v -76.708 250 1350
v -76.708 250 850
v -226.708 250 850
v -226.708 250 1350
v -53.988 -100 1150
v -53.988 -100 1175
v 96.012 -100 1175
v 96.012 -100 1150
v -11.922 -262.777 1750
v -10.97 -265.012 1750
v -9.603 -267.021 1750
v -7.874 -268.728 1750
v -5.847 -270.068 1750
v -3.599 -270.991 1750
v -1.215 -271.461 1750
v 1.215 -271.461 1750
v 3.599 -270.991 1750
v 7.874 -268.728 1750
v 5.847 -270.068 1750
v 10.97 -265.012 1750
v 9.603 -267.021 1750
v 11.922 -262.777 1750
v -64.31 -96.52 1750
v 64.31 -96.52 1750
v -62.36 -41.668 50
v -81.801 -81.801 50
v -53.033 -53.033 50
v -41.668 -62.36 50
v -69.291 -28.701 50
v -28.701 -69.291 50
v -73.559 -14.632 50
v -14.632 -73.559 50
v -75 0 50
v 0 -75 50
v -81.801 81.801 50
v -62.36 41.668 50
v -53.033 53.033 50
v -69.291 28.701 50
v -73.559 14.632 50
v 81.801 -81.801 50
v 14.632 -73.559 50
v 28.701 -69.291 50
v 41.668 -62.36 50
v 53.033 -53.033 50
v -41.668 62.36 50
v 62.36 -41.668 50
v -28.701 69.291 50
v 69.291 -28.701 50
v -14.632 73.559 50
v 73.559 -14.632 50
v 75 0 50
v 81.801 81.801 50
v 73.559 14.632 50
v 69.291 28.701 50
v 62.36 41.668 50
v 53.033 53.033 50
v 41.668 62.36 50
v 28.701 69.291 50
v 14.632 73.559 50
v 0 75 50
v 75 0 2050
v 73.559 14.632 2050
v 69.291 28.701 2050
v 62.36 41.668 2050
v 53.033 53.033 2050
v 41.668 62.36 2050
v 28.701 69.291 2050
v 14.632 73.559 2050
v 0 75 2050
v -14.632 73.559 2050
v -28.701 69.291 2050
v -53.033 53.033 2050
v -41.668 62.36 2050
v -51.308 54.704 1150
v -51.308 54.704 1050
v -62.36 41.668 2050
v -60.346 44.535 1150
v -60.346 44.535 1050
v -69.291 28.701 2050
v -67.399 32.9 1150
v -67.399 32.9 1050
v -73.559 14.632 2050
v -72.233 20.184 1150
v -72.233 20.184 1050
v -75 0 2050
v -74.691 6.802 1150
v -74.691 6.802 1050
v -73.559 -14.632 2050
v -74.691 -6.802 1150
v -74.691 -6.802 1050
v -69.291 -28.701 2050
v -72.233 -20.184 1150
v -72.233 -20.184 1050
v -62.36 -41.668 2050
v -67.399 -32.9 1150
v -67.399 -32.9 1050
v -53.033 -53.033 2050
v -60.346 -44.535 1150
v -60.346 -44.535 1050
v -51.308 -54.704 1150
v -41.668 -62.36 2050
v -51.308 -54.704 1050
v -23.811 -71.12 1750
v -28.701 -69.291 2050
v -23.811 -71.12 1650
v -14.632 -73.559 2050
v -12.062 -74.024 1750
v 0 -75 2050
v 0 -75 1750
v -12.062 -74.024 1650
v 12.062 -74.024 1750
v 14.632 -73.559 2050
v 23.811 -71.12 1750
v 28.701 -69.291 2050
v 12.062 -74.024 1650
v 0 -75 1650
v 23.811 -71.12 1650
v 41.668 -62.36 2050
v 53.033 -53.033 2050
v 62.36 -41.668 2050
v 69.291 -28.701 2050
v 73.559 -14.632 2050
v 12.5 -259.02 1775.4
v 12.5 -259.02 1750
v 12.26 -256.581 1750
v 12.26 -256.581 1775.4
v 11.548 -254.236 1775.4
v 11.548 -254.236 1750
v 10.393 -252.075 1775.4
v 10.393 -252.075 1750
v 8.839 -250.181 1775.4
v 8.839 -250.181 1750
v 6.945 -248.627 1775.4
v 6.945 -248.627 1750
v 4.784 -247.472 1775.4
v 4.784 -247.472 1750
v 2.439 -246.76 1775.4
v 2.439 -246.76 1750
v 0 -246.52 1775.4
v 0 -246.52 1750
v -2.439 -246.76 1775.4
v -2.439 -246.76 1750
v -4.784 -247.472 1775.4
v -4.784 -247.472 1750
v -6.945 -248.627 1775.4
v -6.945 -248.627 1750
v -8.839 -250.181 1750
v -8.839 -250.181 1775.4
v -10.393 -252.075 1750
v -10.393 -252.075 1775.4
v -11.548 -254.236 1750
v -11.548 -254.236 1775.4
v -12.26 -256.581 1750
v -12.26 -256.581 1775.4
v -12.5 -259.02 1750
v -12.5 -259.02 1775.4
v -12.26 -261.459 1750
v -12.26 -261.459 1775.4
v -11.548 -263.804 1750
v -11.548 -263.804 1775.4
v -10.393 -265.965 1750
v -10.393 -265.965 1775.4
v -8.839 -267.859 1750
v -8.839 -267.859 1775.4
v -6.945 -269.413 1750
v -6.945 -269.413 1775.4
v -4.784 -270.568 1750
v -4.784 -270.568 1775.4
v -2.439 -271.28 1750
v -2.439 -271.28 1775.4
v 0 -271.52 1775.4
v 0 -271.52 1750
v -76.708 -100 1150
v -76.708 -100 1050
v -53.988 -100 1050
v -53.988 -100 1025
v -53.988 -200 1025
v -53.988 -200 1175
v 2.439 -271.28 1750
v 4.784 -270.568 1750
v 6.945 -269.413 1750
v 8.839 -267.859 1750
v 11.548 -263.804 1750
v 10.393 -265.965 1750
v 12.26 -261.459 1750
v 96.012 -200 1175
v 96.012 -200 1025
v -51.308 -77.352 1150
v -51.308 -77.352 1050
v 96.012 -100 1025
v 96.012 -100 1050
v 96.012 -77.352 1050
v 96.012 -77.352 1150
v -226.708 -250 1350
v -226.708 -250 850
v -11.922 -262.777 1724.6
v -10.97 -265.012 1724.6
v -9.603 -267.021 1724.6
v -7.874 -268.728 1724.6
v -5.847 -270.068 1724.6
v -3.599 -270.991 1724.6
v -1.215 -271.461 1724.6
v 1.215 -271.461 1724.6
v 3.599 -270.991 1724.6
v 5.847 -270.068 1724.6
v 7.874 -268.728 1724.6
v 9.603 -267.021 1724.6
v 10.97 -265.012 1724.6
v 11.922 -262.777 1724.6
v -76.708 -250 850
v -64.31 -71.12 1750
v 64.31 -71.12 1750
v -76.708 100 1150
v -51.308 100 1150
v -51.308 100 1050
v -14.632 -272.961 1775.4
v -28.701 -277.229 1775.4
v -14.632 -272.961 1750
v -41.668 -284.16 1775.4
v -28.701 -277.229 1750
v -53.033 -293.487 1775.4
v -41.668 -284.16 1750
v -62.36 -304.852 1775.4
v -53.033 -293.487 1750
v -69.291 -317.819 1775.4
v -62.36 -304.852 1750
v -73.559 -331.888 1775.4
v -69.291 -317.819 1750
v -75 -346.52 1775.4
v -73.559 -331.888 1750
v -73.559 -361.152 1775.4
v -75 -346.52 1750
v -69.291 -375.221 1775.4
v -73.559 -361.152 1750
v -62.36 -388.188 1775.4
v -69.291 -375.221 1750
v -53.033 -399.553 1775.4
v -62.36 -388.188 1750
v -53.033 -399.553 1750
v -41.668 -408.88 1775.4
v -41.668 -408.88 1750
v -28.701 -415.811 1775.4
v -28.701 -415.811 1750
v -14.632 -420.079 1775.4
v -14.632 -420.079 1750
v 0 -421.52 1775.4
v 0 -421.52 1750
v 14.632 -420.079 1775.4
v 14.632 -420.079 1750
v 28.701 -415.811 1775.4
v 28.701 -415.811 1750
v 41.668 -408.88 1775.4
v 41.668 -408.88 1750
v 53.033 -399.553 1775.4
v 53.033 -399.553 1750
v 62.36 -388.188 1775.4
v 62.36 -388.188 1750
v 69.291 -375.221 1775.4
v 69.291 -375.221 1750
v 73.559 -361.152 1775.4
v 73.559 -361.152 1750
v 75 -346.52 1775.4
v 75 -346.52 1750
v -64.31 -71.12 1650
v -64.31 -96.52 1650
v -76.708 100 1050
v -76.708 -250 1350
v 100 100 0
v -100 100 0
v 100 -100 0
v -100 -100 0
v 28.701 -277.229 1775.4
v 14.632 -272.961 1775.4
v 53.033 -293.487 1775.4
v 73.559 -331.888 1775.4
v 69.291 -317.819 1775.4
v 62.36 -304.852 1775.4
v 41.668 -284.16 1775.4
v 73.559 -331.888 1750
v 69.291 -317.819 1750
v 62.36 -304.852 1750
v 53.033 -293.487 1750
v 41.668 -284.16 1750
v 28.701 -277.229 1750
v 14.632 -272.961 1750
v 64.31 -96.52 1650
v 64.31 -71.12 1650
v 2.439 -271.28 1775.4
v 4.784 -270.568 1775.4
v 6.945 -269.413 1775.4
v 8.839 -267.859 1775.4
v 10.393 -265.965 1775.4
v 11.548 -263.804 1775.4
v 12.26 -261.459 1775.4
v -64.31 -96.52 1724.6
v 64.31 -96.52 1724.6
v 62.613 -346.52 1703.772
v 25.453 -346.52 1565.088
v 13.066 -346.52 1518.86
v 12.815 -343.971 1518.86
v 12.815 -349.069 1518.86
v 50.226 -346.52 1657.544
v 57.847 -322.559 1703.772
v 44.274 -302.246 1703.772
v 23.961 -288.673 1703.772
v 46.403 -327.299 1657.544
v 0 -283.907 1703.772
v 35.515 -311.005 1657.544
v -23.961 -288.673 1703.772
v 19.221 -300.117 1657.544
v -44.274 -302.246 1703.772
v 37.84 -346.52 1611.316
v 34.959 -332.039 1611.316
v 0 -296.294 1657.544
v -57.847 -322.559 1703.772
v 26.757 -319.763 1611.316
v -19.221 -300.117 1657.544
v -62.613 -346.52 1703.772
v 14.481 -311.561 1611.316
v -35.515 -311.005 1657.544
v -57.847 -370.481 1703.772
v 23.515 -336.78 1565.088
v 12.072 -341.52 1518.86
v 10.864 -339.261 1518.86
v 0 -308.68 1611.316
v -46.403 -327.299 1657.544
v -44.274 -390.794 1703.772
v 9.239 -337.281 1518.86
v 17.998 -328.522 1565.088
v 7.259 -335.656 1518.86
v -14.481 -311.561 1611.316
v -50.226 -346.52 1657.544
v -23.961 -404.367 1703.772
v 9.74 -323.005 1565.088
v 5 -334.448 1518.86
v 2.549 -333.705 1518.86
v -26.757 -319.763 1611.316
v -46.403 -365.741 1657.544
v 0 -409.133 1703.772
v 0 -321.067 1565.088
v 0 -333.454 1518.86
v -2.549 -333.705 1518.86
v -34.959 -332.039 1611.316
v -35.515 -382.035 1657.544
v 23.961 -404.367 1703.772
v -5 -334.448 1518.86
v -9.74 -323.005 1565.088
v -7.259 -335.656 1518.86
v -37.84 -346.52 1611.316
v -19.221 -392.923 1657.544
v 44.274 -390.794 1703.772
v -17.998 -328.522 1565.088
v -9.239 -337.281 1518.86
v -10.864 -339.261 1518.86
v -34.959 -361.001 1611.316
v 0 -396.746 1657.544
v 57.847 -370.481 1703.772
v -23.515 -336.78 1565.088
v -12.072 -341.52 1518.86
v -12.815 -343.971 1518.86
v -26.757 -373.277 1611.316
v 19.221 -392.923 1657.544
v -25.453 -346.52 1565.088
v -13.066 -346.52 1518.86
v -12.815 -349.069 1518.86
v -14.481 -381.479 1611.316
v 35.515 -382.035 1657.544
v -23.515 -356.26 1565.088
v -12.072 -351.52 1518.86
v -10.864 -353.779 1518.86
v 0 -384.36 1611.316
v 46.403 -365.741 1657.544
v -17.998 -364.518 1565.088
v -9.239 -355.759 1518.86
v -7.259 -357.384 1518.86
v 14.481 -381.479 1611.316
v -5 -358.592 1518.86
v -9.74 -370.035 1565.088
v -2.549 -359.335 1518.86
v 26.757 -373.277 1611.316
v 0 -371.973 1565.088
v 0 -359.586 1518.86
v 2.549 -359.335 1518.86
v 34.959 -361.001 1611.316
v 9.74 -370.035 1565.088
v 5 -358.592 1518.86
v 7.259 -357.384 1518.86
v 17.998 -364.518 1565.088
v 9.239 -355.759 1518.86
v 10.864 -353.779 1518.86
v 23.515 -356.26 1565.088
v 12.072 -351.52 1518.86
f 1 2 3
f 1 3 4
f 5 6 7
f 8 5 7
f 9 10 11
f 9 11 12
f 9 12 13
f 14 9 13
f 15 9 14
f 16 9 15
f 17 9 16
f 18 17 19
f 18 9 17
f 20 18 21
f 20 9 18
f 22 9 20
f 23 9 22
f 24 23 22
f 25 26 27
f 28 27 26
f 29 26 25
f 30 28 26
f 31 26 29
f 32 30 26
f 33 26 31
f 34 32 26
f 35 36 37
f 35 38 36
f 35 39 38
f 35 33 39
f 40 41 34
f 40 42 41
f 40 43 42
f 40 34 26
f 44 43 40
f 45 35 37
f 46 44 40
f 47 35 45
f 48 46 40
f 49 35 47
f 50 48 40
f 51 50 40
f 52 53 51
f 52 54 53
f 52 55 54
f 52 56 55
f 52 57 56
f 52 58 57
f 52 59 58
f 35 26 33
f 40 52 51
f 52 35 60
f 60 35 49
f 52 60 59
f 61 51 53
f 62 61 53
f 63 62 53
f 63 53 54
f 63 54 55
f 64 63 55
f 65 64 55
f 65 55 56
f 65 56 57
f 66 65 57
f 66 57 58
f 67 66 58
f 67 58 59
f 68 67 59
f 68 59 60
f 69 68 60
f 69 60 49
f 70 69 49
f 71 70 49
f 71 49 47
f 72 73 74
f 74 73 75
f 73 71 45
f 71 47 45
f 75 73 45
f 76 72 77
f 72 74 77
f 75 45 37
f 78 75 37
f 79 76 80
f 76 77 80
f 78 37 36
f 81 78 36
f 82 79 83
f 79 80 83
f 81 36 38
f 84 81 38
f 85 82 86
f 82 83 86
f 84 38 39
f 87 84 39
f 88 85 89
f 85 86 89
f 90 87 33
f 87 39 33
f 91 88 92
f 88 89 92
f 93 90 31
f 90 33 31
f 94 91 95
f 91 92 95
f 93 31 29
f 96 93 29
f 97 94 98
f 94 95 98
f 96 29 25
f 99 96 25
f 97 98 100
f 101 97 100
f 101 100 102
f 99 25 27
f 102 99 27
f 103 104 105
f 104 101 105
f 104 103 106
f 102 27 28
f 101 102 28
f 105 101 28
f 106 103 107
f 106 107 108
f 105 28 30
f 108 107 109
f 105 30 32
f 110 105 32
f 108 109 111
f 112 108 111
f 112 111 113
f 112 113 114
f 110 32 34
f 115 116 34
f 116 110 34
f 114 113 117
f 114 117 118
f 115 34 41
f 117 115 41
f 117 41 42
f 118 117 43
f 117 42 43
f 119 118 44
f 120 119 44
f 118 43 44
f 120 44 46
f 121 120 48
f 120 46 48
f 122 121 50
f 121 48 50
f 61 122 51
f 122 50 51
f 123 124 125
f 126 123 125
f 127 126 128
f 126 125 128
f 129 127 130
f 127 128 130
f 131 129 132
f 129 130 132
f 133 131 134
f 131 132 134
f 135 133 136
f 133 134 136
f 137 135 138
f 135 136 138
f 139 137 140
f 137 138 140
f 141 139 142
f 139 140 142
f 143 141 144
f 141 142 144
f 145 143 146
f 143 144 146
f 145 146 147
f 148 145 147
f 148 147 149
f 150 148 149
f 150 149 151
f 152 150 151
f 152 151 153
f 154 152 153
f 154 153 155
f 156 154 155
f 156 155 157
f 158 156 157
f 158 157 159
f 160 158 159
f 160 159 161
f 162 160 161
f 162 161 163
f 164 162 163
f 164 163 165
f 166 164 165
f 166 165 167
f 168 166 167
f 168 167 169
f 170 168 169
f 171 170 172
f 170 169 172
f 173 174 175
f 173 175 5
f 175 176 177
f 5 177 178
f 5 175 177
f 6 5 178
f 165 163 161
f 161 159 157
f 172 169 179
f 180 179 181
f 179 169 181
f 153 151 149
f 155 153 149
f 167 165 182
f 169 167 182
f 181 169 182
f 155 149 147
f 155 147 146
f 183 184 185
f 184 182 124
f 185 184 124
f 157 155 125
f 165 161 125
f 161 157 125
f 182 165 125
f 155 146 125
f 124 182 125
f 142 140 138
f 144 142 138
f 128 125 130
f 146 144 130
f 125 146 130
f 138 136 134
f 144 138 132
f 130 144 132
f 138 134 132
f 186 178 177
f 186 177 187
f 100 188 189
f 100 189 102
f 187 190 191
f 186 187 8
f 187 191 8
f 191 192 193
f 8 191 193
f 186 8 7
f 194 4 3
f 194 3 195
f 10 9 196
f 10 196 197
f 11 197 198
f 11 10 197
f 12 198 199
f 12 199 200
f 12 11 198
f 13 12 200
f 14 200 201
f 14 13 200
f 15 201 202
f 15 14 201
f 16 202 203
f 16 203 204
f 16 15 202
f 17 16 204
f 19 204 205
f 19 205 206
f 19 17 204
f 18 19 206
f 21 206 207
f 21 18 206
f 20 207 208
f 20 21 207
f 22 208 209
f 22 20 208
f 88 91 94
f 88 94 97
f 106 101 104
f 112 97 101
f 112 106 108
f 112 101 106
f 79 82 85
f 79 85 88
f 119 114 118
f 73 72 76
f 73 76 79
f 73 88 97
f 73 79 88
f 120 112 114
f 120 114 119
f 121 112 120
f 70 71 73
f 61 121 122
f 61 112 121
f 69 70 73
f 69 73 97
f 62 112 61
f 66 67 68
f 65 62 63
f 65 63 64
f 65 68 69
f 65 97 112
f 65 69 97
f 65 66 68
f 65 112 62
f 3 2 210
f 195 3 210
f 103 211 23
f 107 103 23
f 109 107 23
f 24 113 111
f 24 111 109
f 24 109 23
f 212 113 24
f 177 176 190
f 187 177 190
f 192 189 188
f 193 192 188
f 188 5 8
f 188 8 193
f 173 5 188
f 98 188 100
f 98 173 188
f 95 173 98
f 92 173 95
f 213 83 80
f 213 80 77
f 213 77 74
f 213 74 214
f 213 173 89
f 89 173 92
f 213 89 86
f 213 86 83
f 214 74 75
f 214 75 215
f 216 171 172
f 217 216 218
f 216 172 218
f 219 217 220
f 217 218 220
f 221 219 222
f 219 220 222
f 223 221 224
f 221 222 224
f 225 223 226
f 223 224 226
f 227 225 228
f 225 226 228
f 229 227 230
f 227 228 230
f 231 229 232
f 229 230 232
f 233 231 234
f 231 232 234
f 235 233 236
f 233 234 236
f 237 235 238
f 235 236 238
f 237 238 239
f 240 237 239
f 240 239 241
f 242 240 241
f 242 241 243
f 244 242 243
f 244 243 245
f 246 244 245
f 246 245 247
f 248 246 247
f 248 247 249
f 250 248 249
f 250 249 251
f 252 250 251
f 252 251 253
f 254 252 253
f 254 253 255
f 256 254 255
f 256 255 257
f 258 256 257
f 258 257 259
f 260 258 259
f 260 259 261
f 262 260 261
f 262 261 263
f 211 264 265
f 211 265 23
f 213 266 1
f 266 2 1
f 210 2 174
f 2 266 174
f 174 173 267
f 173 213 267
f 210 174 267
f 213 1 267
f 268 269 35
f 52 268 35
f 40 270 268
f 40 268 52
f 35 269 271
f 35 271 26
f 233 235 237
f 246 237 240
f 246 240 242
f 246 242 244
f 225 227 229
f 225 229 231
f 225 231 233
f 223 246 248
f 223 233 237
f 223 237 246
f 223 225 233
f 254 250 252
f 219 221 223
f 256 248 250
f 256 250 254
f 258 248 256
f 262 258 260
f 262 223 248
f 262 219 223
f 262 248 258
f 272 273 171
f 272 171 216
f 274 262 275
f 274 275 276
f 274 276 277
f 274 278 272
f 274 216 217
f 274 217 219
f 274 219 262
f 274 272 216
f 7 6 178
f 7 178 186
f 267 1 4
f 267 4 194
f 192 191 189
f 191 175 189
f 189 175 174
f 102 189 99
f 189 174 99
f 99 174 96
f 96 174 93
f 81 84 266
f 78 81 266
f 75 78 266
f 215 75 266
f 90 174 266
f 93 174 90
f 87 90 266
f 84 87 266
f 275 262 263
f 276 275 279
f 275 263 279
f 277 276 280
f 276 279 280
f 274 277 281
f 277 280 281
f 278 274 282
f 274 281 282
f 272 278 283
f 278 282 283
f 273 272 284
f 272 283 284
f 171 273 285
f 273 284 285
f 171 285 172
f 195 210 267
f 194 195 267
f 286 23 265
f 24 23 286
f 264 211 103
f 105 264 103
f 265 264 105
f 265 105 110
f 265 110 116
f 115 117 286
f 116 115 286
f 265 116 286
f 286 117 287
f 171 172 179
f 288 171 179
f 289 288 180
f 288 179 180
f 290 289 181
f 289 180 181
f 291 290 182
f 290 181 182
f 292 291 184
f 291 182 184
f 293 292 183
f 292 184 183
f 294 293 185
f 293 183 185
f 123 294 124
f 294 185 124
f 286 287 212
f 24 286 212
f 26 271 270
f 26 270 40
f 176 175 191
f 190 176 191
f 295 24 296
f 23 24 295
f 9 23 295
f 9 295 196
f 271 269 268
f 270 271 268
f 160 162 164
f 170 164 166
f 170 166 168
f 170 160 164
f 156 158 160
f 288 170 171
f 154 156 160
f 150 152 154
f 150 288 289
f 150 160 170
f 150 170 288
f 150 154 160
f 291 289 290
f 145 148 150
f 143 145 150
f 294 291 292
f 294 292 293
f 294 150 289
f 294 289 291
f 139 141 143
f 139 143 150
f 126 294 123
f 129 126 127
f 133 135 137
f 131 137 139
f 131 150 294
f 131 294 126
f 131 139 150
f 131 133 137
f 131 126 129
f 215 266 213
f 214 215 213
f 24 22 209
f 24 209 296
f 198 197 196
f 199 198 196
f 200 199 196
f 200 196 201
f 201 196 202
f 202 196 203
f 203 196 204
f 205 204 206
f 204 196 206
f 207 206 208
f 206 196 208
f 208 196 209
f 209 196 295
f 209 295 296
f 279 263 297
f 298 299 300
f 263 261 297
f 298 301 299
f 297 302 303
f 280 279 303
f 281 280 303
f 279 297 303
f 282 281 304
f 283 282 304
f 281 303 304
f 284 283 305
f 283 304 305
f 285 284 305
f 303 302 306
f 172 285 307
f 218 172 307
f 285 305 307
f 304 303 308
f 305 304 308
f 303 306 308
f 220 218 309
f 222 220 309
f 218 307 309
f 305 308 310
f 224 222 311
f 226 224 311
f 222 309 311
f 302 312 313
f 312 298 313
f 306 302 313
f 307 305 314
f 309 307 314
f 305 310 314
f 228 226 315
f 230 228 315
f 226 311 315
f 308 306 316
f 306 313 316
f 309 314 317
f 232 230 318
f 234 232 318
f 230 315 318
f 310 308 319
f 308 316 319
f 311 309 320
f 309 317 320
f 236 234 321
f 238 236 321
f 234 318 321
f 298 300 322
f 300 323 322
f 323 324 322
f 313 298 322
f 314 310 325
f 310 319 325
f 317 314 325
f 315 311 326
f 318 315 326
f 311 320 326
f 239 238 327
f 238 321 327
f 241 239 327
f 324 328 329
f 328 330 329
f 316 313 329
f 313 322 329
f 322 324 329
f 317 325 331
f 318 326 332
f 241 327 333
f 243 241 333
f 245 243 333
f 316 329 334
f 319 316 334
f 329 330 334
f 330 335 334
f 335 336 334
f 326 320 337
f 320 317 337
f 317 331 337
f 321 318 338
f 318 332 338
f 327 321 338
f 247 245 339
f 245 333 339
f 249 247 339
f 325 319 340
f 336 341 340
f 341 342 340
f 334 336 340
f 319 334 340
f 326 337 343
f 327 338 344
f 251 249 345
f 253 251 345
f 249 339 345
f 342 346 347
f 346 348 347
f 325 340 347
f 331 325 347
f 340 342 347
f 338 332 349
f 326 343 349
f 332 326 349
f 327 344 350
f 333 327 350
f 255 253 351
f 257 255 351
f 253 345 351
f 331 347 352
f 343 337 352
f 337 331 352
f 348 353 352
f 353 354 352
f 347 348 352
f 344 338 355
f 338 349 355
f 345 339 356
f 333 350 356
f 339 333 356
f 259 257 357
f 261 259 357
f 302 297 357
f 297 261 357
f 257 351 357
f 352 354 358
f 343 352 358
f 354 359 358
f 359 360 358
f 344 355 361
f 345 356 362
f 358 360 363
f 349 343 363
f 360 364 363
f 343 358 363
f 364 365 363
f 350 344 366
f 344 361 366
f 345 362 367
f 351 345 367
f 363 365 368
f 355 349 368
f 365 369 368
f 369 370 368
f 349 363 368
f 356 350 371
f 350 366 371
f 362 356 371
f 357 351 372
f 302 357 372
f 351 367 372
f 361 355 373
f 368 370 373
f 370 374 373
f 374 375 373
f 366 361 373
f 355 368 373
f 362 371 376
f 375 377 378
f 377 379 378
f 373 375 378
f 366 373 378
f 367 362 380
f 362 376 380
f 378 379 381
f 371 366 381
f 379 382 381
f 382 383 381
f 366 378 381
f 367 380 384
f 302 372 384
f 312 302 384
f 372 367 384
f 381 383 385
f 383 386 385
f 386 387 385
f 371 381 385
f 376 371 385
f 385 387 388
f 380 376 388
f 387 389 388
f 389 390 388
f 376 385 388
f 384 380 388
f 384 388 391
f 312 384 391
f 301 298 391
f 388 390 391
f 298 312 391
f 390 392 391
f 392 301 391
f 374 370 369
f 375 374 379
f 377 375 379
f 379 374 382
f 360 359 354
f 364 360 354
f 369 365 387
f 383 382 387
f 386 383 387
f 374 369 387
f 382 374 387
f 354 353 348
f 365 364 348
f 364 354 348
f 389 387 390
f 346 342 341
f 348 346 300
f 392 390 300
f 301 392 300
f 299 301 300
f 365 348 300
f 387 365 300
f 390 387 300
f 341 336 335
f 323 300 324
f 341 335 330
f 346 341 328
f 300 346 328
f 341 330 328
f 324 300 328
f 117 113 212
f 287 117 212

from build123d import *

# Parameters (mm, degrees)
F0_W           = 200
F0_H           = 200
F1_DEPTH       = 50
F1_TAPER       = 20
F2_R           = 75
F3_DEPTH       = 2000
F5_W           = 200
F5_H           = 100
F6_DEPTH       = 25.4
F7_W           = 500
F7_H           = 500
F8_DEPTH       = 150
F9_W           = 22.6481758561
F9_H           = 100
F10_DEPTH      = 147.32
F11_W          = 150
F11_H          = 150
F12_DEPTH      = 100
F14_W          = 128.6195661301
F14_H          = 100
F15_DEPTH      = 25.4
F16_R          = 75
F17_DEPTH      = 25.4
F17_DEPTH_BACK = 231.14
F17_TAPER_BACK = 15
F18_R          = 12.5
F19_DEPTH      = 25.4
F21_DEPTH      = 25.4


with BuildPart() as f1:
    # F0 (on Top) → F1 (new body)
    with BuildSketch(Plane.XY):
        Rectangle(F0_W, F0_H)
    extrude(amount=F1_DEPTH, taper=F1_TAPER)

    # F2 (on face) → F3 (join)
    with BuildSketch(Plane.XY.offset(50)):
        Circle(F2_R)
    extrude(amount=F3_DEPTH)

    # F5 (on offset) → F6 (join)
    with BuildSketch(Plane.YZ.offset(-76.708)):
        with Locations((0, 1100)):
            Rectangle(F5_W, F5_H)
    extrude(amount=F6_DEPTH)

    # F7 (on face) → F8 (join)
    with BuildSketch(Plane(origin=(-76.708, 0, 0), x_dir=(0, -1, 0), z_dir=(-1, 0, 0))):
        with Locations((0, 1100)):
            Rectangle(F7_W, F7_H)
    extrude(amount=F8_DEPTH)

    # F9 (on face) → F10 (join)
    with BuildSketch(Plane.YZ.offset(-51.308)):
        with Locations((-88.675912072, 1100)):
            Rectangle(F9_W, F9_H)
    extrude(amount=F10_DEPTH)

    # F11 (on face) → F12 (join)
    with BuildSketch(Plane.XZ.offset(100)):
        with Locations((21.012, 1100)):
            Rectangle(F11_W, F11_H)
    extrude(amount=F12_DEPTH)

    # F14 (on offset) → F15 (join)
    with BuildSketch(Plane.XZ.offset(71.12)):
        with Locations((0, 1700)):
            Rectangle(F14_W, F14_H)
    extrude(amount=F15_DEPTH)


with BuildPart() as f17:
    # F16 (on face) → F17 (new body, two sides)
    with BuildSketch(Plane.XY.offset(1750)) as f17_sk:
        with Locations((0, -346.52)):
            Circle(F16_R)
    extrude(amount=F17_DEPTH)
    extrude(f17_sk.sketch, amount=-F17_DEPTH_BACK, taper=F17_TAPER_BACK)

    # F18 (on face) → F19 (join)
    with BuildSketch(Plane.XY.offset(1750)):
        with Locations((0, -259.02)):
            Circle(F18_R)
    extrude(amount=F19_DEPTH)


with BuildPart() as f21:
    # F20 (on face) → F21 (new body)
    with BuildSketch(Plane.XY.offset(1750)):
        with BuildLine():
            Line((64.3097830651, -96.52), (-64.3097830651, -96.52))
            Line((-64.3097830651, -96.52), (-11.9221379623, -262.7766775756))
            ThreePointArc((-11.9221379623, -262.7766775756), (0, -271.52), (11.9221379623, -262.7766775756))
            Line((11.9221379623, -262.7766775756), (64.3097830651, -96.52))
        make_face()
    extrude(amount=-F21_DEPTH)


solid = Compound([f1.part, f17.part, f21.part])
